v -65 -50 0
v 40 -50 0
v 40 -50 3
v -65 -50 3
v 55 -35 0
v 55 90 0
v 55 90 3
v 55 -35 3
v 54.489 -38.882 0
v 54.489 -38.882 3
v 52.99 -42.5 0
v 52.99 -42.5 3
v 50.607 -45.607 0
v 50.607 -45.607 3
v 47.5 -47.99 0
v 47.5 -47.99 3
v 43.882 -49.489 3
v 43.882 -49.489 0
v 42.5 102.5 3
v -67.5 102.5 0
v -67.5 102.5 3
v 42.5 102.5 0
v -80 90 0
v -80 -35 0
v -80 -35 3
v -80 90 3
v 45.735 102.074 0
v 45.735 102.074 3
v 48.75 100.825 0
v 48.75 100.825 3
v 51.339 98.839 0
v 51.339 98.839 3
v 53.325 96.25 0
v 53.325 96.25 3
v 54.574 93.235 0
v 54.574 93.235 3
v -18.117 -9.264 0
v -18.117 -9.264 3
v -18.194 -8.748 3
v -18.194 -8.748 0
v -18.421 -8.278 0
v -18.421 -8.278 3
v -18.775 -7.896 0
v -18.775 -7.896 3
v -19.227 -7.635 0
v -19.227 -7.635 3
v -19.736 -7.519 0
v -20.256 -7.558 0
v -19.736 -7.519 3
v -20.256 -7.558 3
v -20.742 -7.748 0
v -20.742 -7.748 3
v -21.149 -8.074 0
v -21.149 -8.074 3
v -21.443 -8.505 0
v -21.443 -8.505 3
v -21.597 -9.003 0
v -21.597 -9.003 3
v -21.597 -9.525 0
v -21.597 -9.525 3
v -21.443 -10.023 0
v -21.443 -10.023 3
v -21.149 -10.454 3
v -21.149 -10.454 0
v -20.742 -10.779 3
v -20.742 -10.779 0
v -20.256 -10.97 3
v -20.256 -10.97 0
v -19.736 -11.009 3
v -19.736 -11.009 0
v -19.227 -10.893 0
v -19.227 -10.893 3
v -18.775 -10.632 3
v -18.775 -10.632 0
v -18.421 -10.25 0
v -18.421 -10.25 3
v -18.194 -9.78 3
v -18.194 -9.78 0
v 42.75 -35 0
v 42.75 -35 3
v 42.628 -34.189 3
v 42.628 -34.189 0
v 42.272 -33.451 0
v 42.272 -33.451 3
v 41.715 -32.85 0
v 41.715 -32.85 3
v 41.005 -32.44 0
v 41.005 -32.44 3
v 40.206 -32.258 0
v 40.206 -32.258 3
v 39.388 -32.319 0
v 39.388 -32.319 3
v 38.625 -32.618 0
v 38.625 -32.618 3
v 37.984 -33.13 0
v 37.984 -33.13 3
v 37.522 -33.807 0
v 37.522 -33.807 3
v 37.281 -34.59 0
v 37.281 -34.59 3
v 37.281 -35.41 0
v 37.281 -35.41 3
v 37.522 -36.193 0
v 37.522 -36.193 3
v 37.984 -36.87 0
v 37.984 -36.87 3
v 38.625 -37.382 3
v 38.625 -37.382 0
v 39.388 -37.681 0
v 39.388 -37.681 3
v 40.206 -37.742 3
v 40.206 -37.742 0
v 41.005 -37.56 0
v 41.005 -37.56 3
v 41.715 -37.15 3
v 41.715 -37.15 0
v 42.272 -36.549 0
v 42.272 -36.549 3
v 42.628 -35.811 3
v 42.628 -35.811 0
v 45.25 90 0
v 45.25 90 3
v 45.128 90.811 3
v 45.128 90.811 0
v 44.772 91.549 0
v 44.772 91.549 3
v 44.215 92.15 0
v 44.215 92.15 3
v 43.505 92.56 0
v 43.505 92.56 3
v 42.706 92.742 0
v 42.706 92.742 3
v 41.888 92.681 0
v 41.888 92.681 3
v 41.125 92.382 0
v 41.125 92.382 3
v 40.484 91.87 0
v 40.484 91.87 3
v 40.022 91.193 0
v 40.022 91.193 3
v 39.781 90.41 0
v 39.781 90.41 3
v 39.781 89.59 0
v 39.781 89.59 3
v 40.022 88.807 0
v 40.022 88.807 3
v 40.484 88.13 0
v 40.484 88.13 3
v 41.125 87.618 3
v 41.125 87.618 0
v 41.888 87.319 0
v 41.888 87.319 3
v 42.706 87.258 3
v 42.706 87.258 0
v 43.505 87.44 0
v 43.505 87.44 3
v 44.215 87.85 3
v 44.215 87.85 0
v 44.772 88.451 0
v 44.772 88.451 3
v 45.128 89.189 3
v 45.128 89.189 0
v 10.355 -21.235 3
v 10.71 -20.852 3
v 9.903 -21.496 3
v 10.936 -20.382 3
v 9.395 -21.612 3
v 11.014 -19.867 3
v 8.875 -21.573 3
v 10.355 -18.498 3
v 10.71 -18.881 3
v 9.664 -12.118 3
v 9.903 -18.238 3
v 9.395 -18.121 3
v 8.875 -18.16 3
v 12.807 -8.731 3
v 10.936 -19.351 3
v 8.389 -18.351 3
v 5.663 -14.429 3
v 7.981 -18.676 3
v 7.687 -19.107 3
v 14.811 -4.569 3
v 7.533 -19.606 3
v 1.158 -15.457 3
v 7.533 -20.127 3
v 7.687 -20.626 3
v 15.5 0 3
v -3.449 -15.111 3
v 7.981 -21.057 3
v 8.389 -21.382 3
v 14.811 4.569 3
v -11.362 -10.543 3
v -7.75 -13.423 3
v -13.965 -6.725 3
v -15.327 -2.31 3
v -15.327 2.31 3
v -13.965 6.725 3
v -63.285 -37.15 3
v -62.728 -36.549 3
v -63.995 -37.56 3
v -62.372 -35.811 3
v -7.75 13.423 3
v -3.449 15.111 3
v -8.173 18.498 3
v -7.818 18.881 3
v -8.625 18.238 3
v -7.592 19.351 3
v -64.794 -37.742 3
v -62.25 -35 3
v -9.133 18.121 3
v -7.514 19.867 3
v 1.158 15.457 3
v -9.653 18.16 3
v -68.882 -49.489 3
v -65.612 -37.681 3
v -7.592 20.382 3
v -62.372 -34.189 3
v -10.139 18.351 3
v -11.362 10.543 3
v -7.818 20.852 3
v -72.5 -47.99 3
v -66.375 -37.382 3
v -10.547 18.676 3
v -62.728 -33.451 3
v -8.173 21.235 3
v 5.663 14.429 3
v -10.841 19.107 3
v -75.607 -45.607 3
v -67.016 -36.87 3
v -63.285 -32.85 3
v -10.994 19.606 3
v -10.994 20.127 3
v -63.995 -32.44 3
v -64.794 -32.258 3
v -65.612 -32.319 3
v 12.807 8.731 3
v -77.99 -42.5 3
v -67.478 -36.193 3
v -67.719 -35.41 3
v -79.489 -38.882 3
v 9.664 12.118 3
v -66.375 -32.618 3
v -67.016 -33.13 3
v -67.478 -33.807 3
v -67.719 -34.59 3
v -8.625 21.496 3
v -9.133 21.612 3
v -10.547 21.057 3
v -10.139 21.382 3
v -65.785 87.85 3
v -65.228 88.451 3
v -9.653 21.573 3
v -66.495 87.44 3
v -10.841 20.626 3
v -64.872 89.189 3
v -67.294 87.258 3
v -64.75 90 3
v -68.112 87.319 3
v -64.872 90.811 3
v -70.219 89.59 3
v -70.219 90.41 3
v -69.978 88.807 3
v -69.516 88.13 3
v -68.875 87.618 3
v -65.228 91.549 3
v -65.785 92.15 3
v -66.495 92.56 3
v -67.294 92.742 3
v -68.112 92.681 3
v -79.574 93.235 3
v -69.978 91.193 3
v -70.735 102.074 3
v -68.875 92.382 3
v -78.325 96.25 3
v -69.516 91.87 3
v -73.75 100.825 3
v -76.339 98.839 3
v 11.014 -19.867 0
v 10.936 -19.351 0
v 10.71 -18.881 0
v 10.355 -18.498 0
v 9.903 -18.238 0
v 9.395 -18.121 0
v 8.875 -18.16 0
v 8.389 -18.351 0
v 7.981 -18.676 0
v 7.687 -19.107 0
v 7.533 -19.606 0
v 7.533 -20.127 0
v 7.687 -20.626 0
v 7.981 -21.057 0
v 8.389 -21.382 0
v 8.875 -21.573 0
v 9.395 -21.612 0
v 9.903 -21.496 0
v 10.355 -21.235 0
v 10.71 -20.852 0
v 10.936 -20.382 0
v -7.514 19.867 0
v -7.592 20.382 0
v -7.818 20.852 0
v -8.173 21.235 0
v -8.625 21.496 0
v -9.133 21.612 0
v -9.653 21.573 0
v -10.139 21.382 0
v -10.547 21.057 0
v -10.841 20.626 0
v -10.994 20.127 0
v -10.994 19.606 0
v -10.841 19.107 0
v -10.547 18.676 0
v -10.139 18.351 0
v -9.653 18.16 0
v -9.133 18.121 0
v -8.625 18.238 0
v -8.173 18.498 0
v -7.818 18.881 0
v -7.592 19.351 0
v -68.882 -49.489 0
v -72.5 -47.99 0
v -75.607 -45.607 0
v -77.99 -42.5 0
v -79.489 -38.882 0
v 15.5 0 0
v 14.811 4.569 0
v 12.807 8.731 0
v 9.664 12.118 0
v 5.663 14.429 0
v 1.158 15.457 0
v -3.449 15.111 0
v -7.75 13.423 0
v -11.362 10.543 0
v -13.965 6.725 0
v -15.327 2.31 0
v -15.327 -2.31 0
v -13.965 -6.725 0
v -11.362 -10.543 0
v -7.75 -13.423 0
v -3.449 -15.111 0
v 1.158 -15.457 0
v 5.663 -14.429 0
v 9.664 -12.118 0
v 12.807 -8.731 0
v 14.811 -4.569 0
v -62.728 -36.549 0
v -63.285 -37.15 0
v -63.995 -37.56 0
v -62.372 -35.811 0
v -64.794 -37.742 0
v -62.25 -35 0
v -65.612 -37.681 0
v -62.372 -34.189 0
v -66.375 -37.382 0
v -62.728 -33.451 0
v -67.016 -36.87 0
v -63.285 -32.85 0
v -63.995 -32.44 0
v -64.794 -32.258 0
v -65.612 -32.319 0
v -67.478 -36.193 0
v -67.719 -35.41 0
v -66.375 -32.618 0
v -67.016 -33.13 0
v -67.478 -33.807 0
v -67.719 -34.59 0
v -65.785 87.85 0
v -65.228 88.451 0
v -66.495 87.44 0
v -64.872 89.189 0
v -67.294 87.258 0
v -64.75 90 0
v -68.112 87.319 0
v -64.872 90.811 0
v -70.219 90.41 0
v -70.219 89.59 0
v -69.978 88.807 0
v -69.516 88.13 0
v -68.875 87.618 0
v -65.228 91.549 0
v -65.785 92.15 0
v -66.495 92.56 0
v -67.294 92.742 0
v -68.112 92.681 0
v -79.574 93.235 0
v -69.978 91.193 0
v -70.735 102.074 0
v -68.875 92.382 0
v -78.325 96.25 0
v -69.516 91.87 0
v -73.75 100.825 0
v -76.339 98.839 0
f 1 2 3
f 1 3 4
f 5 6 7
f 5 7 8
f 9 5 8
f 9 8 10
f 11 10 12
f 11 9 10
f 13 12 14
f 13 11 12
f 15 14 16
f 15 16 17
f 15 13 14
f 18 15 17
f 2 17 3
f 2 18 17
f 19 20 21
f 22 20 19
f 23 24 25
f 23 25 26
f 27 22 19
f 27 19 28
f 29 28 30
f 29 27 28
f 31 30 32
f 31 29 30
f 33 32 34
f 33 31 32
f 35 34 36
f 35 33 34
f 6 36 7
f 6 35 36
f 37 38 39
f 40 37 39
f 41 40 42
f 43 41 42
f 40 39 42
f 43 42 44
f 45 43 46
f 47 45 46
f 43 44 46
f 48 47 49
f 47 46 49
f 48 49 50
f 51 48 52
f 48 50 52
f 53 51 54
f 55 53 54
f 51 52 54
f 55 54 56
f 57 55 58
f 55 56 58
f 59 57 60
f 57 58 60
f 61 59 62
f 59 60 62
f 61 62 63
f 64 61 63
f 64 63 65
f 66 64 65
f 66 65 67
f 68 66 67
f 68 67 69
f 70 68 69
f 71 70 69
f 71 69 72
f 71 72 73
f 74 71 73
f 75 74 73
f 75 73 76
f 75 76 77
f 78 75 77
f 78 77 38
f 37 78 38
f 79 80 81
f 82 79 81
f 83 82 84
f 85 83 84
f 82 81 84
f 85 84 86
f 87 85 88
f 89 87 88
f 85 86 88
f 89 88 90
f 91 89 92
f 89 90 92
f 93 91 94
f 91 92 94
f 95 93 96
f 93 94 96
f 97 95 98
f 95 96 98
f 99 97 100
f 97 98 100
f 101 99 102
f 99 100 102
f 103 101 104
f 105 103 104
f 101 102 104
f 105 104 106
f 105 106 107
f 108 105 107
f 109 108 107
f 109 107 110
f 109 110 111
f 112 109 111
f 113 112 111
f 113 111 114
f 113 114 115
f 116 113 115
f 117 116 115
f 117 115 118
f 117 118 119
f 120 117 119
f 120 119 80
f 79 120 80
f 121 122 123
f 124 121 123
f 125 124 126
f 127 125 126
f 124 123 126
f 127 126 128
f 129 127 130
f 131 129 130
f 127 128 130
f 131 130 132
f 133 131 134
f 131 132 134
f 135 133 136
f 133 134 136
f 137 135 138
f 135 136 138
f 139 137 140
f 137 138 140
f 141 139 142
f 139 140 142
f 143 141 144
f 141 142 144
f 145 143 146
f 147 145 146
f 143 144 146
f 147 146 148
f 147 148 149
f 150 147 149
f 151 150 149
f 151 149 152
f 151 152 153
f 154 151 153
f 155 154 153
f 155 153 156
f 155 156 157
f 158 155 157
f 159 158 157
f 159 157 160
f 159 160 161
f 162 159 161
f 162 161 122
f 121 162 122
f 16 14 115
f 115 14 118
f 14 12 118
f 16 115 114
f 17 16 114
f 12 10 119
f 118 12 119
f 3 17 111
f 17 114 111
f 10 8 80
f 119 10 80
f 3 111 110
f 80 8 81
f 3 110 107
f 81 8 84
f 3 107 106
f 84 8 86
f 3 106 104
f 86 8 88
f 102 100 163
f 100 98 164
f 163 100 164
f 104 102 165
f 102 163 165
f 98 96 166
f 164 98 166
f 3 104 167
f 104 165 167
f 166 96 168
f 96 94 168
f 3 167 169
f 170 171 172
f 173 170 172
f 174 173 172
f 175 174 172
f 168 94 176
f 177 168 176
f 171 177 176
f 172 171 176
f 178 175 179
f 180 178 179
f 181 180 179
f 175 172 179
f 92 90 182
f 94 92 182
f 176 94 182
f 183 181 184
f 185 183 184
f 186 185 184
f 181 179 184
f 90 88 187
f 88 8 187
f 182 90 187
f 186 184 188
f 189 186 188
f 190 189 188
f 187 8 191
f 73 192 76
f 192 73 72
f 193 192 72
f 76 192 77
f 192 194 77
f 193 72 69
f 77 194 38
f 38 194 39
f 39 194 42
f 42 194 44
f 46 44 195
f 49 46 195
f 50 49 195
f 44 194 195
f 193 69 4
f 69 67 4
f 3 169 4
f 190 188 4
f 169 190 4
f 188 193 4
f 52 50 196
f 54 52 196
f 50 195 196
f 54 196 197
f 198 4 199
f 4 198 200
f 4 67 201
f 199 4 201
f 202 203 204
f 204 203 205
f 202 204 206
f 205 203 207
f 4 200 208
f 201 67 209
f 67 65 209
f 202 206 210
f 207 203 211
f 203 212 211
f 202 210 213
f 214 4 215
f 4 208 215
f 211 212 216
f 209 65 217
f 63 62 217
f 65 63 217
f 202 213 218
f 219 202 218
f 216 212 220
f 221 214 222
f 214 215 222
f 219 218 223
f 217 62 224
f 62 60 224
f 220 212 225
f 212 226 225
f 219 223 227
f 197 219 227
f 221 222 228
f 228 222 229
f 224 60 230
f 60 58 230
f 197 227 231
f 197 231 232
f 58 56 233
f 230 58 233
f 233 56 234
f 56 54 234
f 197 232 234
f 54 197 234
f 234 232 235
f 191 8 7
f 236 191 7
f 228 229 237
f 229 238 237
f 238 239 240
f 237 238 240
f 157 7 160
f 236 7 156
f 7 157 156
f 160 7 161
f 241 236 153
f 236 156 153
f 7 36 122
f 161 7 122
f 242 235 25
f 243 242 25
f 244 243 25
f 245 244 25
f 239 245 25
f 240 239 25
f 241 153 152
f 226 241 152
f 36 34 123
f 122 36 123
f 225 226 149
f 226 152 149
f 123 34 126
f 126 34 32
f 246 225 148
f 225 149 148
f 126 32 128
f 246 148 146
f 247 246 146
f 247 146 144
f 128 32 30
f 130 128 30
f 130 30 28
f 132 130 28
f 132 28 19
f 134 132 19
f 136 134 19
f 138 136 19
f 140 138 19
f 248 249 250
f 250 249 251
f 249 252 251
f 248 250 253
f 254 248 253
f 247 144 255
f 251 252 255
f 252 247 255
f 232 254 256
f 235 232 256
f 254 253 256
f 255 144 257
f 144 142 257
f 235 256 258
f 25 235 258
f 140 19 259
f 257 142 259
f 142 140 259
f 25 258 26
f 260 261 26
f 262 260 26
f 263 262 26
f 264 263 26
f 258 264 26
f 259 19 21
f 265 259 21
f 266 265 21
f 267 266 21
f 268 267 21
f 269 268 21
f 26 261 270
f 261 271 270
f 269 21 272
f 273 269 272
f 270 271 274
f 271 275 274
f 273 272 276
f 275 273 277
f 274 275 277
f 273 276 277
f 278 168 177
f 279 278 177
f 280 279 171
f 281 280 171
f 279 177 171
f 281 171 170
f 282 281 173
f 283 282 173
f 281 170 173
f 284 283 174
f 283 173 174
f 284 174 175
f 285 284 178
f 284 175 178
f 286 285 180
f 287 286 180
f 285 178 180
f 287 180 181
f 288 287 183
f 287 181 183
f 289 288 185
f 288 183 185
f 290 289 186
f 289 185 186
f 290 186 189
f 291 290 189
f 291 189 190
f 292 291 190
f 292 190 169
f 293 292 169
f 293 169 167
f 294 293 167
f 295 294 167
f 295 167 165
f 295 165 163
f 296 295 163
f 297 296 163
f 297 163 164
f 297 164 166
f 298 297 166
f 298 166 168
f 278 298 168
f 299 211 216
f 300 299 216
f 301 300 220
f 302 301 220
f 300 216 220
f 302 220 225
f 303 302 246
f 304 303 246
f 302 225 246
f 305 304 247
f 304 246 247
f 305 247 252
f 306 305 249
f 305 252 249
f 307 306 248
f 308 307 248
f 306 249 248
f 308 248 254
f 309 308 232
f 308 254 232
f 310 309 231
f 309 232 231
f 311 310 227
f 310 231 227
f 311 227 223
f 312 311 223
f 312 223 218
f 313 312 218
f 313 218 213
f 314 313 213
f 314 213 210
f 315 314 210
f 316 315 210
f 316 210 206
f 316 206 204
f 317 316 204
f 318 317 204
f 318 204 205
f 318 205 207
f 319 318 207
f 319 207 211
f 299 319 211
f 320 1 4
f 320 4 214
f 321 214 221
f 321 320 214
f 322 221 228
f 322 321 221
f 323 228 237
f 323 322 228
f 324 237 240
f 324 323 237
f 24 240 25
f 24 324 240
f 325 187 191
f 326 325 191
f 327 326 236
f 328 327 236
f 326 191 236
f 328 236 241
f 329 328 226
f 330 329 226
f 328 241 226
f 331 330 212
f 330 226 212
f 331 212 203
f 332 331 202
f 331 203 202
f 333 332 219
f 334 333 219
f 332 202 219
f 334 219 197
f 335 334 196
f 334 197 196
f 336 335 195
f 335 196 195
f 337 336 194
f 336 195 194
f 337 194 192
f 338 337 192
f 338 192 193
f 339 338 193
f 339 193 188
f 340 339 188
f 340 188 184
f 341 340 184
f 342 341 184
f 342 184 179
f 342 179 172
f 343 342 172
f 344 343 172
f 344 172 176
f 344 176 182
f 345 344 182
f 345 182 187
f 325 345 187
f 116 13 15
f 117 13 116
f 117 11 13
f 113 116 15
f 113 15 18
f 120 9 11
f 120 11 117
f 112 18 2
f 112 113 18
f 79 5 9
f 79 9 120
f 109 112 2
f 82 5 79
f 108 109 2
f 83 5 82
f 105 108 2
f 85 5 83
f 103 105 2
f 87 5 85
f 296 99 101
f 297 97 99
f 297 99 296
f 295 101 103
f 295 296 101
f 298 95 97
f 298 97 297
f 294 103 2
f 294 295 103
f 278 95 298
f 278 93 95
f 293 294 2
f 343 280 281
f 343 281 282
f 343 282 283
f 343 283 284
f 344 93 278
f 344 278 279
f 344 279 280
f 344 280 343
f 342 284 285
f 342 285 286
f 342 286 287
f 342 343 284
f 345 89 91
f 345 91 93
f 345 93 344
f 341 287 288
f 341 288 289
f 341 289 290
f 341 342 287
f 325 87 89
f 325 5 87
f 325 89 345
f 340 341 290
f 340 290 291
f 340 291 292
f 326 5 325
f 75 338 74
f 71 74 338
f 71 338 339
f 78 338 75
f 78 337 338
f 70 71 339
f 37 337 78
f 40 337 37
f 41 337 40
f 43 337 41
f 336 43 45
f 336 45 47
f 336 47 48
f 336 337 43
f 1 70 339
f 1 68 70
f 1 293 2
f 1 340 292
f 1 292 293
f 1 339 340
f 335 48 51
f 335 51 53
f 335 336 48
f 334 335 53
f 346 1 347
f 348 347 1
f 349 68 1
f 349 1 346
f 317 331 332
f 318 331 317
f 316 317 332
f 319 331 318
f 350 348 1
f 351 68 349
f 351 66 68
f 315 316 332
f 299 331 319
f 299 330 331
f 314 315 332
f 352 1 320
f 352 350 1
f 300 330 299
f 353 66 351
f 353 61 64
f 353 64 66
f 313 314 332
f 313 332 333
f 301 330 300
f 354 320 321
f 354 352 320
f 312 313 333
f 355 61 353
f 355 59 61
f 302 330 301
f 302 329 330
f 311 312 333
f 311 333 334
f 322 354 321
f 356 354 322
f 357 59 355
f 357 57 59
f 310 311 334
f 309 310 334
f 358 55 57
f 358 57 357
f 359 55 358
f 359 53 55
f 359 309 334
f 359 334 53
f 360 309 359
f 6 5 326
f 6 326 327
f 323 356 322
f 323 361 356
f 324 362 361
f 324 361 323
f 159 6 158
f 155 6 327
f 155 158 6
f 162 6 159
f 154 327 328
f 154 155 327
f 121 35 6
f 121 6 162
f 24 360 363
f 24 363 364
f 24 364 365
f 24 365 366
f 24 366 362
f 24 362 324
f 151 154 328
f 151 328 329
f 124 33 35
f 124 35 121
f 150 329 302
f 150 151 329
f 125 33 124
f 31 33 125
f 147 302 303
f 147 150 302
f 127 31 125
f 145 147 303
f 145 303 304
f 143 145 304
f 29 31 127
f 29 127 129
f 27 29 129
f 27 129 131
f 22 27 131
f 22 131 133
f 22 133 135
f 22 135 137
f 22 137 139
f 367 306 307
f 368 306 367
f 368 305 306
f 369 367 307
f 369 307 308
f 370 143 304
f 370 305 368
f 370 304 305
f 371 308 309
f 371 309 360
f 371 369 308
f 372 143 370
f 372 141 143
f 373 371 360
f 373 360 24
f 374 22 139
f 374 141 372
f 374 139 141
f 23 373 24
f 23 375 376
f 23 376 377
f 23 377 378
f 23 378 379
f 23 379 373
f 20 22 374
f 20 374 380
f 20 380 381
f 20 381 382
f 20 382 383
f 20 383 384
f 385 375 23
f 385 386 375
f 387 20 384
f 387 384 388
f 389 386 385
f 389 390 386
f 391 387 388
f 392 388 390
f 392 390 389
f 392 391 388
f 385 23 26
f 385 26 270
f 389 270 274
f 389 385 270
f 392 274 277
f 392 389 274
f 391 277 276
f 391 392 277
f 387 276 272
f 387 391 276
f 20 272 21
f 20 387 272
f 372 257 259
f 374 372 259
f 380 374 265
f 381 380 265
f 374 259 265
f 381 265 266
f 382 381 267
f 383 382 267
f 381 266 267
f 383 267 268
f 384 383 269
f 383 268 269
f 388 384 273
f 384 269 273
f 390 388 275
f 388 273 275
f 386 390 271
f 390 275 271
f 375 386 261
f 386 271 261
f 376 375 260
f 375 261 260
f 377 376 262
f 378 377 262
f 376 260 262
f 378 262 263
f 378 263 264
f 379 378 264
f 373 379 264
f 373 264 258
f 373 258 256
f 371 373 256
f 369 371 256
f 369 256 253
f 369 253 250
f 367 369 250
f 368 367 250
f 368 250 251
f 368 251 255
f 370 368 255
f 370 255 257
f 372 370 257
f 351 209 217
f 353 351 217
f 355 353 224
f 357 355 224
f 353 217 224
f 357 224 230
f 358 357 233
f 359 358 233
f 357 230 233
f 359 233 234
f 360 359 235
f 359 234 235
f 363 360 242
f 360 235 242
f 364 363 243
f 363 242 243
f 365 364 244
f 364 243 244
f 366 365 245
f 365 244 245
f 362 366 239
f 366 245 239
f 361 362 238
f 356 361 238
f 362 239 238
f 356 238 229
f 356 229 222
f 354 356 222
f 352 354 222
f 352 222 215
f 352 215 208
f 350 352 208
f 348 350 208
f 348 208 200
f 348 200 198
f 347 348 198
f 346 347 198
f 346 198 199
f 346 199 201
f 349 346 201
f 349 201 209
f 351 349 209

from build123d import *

# Parameters (mm, degrees)
BASE_FLANGE1_DEPTH   = 3
SKETCH2_R            = 15.5
SKETCH2_R_2          = 1.75
CUT_EXTRUDE1_DEPTH   = 131.05864062
M5_CLEARANCE_HOLE1_D = 5.5


# Sheet-metal steps are written as plain solids
with BuildPart() as part:
    # Sketch1 → Base-Flange1 (new body)
    with BuildSketch(Plane.XY):
        with BuildLine():
            Line((-67.5, 102.5), (42.5, 102.5))
            ThreePointArc((42.5, 102.5), (51.338834765, 98.838834765), (55, 90))
            Line((55, 90), (55, -35))
            ThreePointArc((55, -35), (50.606601718, -45.606601718), (40, -50))
            Line((40, -50), (-65, -50))
            ThreePointArc((-65, -50), (-75.606601718, -45.606601718), (-80, -35))
            Line((-80, -35), (-80, 90))
            ThreePointArc((-80, 90), (-76.338834765, 98.838834765), (-67.5, 102.5))
        make_face()
    extrude(amount=BASE_FLANGE1_DEPTH)

    # Sketch2 → Cut-Extrude1 (cut, through all)
    with BuildSketch(Plane.XY.offset(3)):
        Circle(SKETCH2_R)
        with Locations((-19.866547844, -9.263923401)):
            Circle(SKETCH2_R_2)
        with Locations((9.263923401, -19.866547844)):
            Circle(SKETCH2_R_2)
        with Locations((-9.263923401, 19.866547844)):
            Circle(SKETCH2_R_2)
    extrude(amount=-CUT_EXTRUDE1_DEPTH, mode=Mode.SUBTRACT)

    # M5 Clearance Hole1 (through all)
    with Locations(Plane(origin=(0, 0, 0), x_dir=(-1, 0, 0), z_dir=(0, 0, -1))):
        with Locations((-40, -35), (67.5, 90), (65, -35), (-42.5, 90)):
            Hole(M5_CLEARANCE_HOLE1_D / 2)


solid = part.part
